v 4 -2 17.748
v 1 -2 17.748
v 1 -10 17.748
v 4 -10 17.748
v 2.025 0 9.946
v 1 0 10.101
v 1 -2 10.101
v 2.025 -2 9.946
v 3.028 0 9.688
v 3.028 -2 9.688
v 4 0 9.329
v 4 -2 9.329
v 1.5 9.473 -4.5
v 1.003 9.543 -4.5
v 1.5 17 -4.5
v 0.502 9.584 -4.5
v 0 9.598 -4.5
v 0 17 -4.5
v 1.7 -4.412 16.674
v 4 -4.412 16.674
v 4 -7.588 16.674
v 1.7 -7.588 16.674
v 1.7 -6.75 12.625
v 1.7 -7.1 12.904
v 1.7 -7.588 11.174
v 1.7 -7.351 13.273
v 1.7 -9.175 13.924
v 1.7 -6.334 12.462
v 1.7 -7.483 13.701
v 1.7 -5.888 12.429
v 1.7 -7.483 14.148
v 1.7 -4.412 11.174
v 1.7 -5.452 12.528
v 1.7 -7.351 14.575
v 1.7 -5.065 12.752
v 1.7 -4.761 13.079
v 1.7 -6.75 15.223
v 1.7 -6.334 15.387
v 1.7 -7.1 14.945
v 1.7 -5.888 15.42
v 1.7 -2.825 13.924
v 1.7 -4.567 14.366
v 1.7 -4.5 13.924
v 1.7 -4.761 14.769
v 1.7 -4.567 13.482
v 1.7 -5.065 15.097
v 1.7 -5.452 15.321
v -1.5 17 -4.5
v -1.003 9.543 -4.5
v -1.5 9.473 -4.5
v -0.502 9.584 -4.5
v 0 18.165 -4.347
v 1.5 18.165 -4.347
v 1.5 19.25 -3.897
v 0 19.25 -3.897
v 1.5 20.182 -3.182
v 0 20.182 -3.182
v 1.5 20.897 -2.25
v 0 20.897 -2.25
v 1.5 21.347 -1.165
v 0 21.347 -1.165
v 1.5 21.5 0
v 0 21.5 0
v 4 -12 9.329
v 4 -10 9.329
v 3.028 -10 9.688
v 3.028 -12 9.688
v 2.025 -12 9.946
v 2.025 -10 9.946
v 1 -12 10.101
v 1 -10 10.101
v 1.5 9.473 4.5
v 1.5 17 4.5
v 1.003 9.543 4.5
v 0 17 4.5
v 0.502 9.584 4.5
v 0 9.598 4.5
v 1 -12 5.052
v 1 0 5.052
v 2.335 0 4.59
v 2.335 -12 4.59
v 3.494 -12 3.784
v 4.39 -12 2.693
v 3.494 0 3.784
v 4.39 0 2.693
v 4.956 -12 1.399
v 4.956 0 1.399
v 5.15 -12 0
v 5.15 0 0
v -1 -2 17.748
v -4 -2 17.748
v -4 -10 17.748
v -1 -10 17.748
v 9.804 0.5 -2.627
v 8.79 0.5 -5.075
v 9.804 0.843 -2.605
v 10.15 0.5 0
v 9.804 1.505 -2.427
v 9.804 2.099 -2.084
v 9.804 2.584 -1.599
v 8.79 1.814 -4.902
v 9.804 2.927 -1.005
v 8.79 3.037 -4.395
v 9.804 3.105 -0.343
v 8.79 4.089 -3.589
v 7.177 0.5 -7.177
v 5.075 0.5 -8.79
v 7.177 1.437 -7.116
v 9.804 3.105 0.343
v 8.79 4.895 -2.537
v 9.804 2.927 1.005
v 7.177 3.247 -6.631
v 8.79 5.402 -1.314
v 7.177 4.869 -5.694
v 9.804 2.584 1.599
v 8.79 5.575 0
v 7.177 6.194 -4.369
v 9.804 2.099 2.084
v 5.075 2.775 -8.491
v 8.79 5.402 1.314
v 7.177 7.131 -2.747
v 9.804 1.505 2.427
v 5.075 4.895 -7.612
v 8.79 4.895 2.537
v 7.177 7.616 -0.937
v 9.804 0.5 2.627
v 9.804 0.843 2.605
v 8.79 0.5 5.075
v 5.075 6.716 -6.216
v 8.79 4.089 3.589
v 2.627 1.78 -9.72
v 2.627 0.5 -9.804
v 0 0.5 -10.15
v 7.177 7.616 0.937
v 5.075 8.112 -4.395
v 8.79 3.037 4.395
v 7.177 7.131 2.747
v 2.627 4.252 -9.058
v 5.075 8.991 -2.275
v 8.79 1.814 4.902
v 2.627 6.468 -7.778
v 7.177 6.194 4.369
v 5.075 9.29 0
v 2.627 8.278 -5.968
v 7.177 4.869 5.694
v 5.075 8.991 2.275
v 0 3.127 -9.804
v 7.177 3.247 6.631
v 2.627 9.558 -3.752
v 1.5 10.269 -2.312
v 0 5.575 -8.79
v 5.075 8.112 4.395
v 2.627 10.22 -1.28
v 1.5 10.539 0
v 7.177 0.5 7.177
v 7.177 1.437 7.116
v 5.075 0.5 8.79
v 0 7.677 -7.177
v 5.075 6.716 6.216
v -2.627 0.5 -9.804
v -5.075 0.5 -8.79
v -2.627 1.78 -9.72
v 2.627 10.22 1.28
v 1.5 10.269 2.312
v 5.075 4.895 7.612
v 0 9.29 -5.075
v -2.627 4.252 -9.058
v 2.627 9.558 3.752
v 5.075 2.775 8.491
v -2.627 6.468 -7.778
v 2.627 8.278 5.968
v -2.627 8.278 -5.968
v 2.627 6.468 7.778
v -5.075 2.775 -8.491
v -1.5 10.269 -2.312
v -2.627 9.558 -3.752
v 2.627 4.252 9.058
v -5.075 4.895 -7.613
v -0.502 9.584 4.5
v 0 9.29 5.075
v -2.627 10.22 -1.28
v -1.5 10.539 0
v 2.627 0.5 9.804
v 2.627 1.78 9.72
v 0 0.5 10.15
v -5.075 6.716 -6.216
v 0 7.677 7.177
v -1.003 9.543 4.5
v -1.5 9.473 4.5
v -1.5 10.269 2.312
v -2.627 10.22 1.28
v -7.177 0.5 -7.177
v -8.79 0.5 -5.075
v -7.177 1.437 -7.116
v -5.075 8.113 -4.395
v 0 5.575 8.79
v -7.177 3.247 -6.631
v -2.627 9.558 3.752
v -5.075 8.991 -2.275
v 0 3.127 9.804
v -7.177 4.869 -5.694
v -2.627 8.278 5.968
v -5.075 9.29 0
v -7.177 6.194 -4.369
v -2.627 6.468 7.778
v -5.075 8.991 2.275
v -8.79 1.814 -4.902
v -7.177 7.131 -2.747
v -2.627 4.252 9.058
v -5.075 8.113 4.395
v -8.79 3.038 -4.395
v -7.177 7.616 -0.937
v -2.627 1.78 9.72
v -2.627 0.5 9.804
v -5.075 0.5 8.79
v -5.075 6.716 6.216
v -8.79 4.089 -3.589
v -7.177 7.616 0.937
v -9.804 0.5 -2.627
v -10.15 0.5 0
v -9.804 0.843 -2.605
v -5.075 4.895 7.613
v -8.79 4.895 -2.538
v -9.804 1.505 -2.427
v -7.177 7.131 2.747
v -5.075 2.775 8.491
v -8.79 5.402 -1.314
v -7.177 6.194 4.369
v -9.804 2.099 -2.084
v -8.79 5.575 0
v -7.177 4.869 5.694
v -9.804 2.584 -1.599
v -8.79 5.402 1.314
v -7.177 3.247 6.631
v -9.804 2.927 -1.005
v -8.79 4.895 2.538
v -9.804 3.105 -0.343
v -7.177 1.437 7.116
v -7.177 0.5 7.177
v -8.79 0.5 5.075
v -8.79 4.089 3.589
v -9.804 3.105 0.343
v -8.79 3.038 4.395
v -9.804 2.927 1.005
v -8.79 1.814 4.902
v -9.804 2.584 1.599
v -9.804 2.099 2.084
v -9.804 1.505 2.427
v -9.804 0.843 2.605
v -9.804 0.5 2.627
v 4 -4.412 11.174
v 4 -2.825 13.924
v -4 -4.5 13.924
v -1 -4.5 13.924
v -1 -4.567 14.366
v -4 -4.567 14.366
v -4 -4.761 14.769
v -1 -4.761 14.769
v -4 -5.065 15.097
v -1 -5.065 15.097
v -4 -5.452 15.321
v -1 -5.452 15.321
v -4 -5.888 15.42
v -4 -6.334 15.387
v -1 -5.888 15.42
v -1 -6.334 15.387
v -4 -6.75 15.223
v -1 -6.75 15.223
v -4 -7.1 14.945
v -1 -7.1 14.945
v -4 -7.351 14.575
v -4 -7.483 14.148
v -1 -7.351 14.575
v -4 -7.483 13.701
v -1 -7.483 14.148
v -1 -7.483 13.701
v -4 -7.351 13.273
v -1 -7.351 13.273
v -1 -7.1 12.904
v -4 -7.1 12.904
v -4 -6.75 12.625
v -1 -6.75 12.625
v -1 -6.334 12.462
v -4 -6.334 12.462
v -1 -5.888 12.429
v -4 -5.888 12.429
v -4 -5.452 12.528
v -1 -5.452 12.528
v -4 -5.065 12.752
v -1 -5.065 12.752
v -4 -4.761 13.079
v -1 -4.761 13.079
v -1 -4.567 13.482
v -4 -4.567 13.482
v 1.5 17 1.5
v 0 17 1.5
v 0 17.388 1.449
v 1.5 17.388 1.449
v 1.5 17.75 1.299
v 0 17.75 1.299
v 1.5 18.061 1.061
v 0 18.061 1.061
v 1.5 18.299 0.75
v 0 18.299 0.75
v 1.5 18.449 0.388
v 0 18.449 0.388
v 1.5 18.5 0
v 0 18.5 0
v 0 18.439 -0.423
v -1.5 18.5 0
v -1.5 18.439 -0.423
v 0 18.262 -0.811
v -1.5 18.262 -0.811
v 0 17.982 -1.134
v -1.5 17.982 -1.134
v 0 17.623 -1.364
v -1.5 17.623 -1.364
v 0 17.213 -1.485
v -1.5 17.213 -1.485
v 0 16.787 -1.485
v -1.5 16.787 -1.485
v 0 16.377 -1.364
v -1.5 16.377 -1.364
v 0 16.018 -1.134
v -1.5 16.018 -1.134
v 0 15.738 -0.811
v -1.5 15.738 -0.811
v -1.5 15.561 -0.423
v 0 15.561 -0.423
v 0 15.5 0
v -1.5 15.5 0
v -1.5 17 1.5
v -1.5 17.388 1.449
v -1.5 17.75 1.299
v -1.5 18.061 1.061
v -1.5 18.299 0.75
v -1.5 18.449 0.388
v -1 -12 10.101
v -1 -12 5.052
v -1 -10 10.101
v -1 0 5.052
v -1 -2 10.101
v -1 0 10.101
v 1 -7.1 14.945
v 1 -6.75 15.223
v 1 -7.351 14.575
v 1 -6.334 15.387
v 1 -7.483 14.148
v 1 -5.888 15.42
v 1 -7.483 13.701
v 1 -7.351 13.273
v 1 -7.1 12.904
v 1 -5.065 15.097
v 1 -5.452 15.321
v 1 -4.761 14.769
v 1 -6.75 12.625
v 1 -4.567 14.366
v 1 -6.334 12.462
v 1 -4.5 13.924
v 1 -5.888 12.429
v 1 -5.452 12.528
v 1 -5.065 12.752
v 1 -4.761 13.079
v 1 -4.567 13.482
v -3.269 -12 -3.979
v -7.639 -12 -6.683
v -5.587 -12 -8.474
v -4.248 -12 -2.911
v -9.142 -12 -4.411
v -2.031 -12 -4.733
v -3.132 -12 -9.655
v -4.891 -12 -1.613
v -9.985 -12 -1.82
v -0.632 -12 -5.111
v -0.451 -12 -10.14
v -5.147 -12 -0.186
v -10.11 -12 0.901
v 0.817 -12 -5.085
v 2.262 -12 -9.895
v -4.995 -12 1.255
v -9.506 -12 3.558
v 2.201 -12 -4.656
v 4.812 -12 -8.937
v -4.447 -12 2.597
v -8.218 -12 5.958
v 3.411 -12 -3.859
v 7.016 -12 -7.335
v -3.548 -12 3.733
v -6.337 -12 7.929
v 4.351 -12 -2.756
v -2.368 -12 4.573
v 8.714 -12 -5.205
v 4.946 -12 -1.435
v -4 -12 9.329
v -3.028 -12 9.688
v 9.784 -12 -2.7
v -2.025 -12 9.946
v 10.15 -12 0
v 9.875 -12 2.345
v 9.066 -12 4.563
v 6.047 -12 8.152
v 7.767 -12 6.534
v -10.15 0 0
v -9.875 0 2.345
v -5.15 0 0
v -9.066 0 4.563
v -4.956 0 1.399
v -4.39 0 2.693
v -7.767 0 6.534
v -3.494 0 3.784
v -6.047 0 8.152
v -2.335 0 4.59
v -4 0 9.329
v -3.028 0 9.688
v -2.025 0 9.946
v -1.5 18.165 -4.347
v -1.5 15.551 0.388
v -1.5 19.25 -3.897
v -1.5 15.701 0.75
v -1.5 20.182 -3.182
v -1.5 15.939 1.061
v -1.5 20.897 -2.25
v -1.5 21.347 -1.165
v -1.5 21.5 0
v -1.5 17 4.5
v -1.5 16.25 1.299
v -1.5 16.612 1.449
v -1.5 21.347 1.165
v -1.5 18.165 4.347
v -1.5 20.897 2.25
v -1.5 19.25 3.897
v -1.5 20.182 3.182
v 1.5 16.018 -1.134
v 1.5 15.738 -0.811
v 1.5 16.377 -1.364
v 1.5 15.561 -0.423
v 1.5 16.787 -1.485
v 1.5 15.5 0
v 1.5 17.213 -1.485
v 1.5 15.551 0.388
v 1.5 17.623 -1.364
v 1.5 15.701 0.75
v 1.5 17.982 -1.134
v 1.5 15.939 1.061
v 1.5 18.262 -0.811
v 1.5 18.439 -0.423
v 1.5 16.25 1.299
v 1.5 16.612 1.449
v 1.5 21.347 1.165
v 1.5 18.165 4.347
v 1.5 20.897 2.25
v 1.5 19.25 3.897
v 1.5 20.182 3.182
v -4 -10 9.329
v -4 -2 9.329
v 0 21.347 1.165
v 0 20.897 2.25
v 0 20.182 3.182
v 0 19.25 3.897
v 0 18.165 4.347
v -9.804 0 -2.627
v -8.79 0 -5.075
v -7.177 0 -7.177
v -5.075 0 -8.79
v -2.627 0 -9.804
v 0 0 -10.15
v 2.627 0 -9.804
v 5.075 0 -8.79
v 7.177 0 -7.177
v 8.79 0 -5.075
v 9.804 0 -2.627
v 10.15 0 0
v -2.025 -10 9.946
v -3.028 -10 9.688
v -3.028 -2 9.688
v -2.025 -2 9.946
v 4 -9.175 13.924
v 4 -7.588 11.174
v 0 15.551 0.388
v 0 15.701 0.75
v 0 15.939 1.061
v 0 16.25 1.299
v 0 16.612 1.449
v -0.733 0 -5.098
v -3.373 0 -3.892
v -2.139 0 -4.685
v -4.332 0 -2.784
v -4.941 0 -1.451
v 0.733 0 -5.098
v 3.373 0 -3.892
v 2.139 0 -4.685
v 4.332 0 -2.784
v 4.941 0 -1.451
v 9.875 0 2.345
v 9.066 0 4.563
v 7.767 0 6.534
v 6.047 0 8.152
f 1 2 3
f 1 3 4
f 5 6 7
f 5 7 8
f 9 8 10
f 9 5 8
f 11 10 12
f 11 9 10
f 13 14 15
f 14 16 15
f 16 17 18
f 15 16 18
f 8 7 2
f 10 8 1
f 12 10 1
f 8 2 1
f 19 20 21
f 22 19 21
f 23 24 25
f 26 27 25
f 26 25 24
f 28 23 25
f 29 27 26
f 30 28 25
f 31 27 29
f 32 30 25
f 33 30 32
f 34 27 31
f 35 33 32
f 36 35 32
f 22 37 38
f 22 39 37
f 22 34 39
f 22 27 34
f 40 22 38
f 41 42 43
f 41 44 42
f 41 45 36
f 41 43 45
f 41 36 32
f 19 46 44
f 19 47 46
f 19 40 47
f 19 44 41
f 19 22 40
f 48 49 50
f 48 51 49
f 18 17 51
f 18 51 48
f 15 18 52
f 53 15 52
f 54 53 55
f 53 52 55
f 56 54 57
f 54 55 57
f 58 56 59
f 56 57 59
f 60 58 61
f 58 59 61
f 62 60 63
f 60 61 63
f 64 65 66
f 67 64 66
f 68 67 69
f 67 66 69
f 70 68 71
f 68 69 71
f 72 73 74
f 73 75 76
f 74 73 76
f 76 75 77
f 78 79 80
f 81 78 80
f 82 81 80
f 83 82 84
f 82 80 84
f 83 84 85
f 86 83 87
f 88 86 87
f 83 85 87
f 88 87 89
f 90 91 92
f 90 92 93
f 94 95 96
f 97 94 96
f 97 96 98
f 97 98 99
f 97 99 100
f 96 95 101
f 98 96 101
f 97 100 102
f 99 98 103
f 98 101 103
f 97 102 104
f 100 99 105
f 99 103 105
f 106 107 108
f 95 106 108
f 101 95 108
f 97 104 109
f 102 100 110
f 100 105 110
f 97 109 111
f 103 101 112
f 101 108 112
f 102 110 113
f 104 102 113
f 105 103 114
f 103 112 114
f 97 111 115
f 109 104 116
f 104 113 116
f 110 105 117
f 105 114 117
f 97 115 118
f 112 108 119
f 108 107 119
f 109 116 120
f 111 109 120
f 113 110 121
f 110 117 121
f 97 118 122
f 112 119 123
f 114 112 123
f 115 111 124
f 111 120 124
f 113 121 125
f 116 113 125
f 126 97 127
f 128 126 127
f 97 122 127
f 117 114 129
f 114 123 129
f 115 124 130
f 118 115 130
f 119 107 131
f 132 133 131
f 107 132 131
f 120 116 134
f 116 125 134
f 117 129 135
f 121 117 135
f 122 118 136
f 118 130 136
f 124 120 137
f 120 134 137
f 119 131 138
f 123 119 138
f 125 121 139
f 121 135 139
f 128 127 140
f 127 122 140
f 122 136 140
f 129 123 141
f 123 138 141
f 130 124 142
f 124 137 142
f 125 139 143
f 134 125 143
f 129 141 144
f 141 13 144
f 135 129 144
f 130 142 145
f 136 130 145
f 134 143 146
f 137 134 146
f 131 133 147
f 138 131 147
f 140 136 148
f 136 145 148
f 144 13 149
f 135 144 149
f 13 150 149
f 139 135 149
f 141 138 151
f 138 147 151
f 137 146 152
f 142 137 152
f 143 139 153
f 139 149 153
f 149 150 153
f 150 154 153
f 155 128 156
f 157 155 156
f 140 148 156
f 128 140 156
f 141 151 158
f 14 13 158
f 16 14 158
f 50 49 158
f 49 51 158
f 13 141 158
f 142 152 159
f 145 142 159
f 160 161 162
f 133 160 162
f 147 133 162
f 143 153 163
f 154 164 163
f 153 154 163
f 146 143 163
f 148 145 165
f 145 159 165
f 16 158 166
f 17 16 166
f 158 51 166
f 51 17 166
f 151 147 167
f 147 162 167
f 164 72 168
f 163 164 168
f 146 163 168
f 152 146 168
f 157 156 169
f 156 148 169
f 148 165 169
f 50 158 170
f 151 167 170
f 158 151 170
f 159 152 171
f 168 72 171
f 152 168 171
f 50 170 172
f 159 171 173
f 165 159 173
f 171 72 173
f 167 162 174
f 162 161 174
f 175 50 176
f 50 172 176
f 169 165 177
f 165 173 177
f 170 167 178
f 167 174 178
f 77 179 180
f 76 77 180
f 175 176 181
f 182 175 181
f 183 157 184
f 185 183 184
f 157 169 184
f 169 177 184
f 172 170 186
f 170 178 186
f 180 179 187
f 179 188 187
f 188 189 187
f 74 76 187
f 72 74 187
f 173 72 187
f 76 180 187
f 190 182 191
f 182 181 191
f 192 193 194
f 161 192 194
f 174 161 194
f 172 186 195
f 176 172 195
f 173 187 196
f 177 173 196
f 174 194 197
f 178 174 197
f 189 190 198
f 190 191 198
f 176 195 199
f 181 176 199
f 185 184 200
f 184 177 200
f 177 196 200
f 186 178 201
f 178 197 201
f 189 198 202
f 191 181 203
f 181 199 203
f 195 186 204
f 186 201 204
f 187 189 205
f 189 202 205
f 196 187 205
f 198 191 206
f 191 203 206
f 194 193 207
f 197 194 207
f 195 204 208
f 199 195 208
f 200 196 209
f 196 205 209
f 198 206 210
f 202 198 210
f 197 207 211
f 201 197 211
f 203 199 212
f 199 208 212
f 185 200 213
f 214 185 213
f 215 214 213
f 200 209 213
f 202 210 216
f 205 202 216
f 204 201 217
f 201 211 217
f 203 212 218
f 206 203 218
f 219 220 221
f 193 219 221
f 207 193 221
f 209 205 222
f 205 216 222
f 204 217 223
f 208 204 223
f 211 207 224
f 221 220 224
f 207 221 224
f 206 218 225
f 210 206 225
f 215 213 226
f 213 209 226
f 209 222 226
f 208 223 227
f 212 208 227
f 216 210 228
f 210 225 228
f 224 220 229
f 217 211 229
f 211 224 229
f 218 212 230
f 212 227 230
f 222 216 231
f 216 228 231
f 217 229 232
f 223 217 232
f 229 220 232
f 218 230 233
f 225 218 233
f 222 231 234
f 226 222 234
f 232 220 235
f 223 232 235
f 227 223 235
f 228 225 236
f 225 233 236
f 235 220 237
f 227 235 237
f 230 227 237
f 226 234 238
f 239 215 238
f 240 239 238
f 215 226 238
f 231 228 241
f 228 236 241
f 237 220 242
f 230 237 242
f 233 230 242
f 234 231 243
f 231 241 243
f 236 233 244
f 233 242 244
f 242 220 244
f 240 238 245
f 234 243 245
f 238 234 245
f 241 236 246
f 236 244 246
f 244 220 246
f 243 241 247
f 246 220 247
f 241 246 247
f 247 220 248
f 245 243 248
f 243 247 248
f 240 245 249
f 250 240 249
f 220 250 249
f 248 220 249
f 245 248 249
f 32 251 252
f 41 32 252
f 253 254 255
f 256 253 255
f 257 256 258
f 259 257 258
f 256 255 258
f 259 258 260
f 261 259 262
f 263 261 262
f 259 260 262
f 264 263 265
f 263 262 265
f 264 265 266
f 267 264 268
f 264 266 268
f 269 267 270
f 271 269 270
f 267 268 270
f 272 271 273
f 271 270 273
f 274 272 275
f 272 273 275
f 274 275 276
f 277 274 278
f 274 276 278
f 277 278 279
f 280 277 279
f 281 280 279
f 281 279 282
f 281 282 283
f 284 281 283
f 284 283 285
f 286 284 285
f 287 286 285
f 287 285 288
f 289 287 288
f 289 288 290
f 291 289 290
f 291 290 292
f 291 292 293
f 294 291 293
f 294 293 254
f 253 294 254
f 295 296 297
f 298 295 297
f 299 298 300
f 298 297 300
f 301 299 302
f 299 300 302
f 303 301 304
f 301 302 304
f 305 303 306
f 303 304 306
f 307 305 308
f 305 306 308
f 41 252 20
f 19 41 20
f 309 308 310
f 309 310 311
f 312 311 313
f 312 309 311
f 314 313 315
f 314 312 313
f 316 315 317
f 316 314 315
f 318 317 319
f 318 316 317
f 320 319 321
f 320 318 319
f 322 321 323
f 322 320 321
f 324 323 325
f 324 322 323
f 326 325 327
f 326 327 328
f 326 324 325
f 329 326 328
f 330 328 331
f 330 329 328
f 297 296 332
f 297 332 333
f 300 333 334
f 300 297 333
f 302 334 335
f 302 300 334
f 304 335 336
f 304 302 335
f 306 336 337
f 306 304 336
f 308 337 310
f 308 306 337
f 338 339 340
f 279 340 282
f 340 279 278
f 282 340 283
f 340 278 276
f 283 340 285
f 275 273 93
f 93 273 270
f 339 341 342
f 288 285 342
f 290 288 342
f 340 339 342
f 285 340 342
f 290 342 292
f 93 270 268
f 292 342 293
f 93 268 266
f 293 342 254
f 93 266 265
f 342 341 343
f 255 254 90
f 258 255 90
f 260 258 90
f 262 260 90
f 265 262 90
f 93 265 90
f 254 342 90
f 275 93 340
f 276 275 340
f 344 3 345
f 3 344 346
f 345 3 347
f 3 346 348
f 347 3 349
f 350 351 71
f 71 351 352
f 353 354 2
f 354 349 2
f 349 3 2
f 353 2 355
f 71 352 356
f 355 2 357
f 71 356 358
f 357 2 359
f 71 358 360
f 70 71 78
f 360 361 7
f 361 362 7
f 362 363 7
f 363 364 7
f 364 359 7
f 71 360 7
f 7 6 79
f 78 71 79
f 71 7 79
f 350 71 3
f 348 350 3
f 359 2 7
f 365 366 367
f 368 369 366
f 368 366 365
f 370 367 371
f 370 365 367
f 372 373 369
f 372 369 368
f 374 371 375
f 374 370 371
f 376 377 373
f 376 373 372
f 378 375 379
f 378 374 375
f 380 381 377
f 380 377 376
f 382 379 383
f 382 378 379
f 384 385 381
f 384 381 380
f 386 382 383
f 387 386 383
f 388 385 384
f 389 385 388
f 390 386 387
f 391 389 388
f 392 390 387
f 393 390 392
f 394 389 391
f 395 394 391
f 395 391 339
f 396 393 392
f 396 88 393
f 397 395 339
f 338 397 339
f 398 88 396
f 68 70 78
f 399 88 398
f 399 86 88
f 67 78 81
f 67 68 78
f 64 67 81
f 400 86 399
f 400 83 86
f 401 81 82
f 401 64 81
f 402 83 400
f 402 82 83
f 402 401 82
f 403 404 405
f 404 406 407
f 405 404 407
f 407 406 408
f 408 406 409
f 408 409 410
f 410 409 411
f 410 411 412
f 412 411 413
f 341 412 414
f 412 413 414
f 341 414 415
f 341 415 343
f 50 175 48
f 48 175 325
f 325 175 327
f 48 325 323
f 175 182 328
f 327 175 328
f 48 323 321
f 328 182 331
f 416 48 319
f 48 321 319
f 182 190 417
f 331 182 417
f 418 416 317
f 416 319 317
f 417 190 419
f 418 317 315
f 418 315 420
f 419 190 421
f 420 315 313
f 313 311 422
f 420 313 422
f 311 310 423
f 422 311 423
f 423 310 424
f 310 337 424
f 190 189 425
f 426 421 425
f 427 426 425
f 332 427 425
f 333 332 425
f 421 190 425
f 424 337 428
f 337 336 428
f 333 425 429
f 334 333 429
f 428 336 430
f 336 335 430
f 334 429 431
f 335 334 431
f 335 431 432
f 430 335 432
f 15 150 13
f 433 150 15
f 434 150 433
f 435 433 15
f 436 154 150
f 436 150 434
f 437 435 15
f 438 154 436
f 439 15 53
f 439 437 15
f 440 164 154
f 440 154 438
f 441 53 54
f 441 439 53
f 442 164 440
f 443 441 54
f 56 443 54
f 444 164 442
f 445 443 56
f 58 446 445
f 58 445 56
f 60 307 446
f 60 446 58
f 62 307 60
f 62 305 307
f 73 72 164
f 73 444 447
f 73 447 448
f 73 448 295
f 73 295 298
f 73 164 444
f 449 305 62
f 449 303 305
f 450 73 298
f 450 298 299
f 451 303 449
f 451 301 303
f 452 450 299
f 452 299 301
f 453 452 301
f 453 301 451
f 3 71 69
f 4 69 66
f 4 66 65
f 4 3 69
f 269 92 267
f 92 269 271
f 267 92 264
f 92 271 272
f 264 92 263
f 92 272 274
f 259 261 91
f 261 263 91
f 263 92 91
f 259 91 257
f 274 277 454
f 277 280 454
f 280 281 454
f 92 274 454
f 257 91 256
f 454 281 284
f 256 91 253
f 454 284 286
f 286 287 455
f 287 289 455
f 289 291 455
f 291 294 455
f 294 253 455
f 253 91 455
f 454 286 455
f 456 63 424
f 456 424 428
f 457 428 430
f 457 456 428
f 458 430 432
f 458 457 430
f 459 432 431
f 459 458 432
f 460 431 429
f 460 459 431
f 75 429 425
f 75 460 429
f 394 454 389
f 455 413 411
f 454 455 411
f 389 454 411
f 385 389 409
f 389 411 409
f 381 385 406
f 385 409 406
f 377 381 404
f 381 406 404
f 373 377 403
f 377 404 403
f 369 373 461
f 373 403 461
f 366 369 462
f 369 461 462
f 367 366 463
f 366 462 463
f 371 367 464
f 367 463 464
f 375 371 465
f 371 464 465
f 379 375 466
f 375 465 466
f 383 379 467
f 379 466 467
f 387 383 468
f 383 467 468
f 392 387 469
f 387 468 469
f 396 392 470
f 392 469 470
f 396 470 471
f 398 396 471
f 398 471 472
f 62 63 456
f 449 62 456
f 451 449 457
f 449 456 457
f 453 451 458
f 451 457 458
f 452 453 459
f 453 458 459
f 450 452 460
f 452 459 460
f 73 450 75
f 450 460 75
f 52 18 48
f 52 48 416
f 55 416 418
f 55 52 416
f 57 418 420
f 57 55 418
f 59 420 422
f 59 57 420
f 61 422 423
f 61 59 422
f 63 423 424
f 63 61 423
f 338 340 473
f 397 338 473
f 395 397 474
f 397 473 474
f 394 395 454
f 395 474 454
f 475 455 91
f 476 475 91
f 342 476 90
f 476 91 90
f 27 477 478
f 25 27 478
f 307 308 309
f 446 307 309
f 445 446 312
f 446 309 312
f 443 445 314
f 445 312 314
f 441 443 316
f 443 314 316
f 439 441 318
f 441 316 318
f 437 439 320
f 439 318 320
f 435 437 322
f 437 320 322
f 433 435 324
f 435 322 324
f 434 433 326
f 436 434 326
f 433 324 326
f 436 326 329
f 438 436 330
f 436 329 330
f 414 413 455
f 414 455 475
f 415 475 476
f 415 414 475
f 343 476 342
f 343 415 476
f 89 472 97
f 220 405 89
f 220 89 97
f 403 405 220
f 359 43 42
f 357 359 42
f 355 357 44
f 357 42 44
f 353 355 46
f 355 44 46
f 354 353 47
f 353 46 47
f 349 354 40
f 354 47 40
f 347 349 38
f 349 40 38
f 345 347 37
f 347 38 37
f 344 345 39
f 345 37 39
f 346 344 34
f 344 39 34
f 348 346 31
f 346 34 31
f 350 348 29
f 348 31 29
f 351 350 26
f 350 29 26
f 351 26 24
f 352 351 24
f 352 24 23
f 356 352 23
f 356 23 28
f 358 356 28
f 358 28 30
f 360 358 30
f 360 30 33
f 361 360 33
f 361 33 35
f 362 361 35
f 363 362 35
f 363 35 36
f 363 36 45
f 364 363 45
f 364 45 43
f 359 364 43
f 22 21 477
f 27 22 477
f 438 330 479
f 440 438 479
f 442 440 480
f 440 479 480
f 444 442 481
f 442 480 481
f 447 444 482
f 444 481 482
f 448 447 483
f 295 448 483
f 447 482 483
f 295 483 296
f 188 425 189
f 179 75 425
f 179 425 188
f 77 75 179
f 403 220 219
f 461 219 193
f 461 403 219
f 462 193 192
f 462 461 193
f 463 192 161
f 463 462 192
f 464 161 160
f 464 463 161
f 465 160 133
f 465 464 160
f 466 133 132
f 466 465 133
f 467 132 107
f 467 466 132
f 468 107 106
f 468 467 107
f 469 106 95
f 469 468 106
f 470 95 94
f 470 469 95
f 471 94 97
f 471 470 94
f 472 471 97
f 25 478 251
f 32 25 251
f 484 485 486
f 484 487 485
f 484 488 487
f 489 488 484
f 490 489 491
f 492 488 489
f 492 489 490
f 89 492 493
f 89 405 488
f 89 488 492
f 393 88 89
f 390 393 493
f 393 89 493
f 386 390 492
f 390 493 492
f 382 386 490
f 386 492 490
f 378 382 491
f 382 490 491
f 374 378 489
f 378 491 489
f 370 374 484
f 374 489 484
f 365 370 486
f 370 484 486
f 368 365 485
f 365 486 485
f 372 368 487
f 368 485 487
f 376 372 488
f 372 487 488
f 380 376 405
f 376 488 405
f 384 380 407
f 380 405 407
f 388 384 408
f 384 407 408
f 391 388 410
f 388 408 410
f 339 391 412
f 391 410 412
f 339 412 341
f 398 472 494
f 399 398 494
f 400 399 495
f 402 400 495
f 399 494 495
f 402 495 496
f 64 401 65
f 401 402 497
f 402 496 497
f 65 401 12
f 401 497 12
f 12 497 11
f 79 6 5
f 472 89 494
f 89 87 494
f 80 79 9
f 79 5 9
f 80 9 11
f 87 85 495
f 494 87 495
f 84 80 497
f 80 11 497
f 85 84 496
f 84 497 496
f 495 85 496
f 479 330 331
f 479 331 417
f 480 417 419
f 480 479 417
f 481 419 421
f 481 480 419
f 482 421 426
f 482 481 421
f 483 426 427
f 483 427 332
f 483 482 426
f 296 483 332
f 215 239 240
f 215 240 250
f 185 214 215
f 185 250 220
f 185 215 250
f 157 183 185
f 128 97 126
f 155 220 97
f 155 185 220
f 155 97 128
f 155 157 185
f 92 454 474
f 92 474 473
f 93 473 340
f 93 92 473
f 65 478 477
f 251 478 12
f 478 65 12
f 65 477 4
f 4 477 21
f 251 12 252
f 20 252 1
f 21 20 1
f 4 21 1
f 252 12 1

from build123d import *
from build123d import SkipClean  # not in build123d's __all__

# Parameters (mm, degrees)
F1_DEPTH  = 12
F0_W      = 3
F0_H      = 2.5
F2_DEPTH  = 10
F3_DEPTH  = 2
F5_R      = 1.5
F6_DEPTH  = 25
F7_DEPTH  = 2.3
F9_DEPTH  = 0.5
F11_ANGLE = 180
F12_DEPTH = 1.5


with BuildPart() as f1:
    # F0 (on Front) → F1 (new body)
    with BuildSketch(Plane.XZ):
        with BuildLine():
            Line((-4, 9.3285851017), (-1, 9.3285851017))
            Line((-1, 9.3285851017), (-1, 10.1006187929))
            ThreePointArc((-1, 10.1006187929), (-2.529626258, 9.8297248687), (-4, 9.3285851017))
        make_face()
        with BuildLine():
            Line((1, 10.1006187929), (1, 9.3285851017))
            Line((1, 9.3285851017), (4, 9.3285851017))
            ThreePointArc((4, 9.3285851017), (2.529626258, 9.8297248687), (1, 10.1006187929))
        make_face()
        with BuildLine():
            ThreePointArc((1, 5.0519798099), (3.9794786091, 3.2689830223), (5.15, 0))
            ThreePointArc((5.15, 0), (-3.2689830223, -3.9794786091), (-1, 5.0519798099))
            Line((-1, 5.0519798099), (-1, 9.3285851017))
            Line((-1, 9.3285851017), (-4, 9.3285851017))
            ThreePointArc((-4, 9.3285851017), (-5.5867029633, -8.474151875), (10.15, 0))
            ThreePointArc((10.15, 0), (8.474151875, 5.5867029633), (4, 9.3285851017))
            Line((4, 9.3285851017), (1, 9.3285851017))
            Line((1, 9.3285851017), (1, 5.0519798099))
        make_face()
    extrude(amount=F1_DEPTH)

    # F0 (on Front) → F2 (join)
    with BuildSketch(Plane.XZ):
        with BuildLine():
            ThreePointArc((-4, 9.3285851017), (-2.529626258, 9.8297248687), (-1, 10.1006187929))
            Line((-1, 10.1006187929), (-1, 15.2480201901))
            Line((-1, 15.2480201901), (-4, 15.2480201901))
            Line((-4, 15.2480201901), (-4, 9.3285851017))
        make_face()
        with BuildLine():
            Line((1, 15.2480201901), (1, 10.1006187929))
            ThreePointArc((1, 10.1006187929), (2.529626258, 9.8297248687), (4, 9.3285851017))
            Line((4, 9.3285851017), (4, 15.2480201901))
            Line((4, 15.2480201901), (1, 15.2480201901))
        make_face()
        with Locations((-2.5, 16.4980201901)):
            Rectangle(F0_W, F0_H)
        with Locations((2.5, 16.4980201901)):
            Rectangle(F0_W, F0_H)
    extrude(amount=F2_DEPTH)

    # F0 (on Front) → F3 (cut)
    with BuildSketch(Plane.XZ):
        with BuildLine():
            ThreePointArc((-4, 9.3285851017), (-2.529626258, 9.8297248687), (-1, 10.1006187929))
            Line((-1, 10.1006187929), (-1, 15.2480201901))
            Line((-1, 15.2480201901), (-4, 15.2480201901))
            Line((-4, 15.2480201901), (-4, 9.3285851017))
        make_face()
        with BuildLine():
            Line((1, 15.2480201901), (1, 10.1006187929))
            ThreePointArc((1, 10.1006187929), (2.529626258, 9.8297248687), (4, 9.3285851017))
            Line((4, 9.3285851017), (4, 15.2480201901))
            Line((4, 15.2480201901), (1, 15.2480201901))
        make_face()
        with Locations((-2.5, 16.4980201901)):
            Rectangle(F0_W, F0_H)
        with Locations((2.5, 16.4980201901)):
            Rectangle(F0_W, F0_H)
    with SkipClean():  # cleaning this boolean's faces spoils the solid; the shape is the same uncleaned
        extrude(amount=F3_DEPTH, mode=Mode.SUBTRACT)

    # F5 (on face) → F6 (cut)
    with BuildSketch(Plane.YZ.offset(4)):
        with Locations((-6, 13.9243194915)):
            Circle(F5_R)
    extrude(amount=-F6_DEPTH, mode=Mode.SUBTRACT)

    # F5 (on face) → F7 (cut)
    with BuildSketch(Plane.YZ.offset(4)):
        Polygon((-4.4122867597, 16.6743194915), (-7.5877132403, 16.6743194915), (-9.1754264805, 13.9243194915), (-7.5877132403, 11.1743194915), (-4.4122867597, 11.1743194915), (-2.8245735195, 13.9243194915), align=None)
        with Locations((-6, 13.9243194915)):
            Circle(F5_R, mode=Mode.SUBTRACT)
    extrude(amount=-F7_DEPTH, mode=Mode.SUBTRACT)

    # F8 (on face) → F9 (join)
    with BuildSketch(Plane.XZ):
        with BuildLine():
            Line((10.15, 0), (5.15, 0))
            ThreePointArc((5.15, 0), (0, -5.15), (-5.15, 0))
            Line((-5.15, 0), (-10.15, 0))
            ThreePointArc((-10.15, 0), (0, -10.15), (10.15, 0))
        make_face()
        with BuildLine():
            ThreePointArc((-5.15, 0), (0, -5.15), (5.15, 0))
            Line((5.15, 0), (-5.15, 0))
        make_face()
    extrude(amount=-F9_DEPTH)

    # F9_face (on face) → F11 (revolve)
    with BuildSketch(Plane(origin=(0, 0.5, -4.307793793), x_dir=(1, 0, 0), z_dir=(0, 1, 0))):
        with BuildLine():
            Line((-10.15, -4.307793793), (10.15, -4.307793793))
            ThreePointArc((10.15, -4.307793793), (0, 5.842206207), (-10.15, -4.307793793))
        make_face()
    revolve(axis=Axis((0, 0.5, 0), (1, 0, 0)), revolution_arc=F11_ANGLE)

    # F10 (on Right) → F12 (join, symmetric)
    with BuildSketch(Plane.YZ):
        with BuildLine():
            ThreePointArc((17, 4.5), (13.8180194847, 3.1819805153), (12.5, 0))
            Line((12.5, 0), (15.5, 0))
            ThreePointArc((15.5, 0), (15.9393398282, 1.0606601718), (17, 1.5))
            Line((17, 1.5), (17, 4.5))
        make_face()
        with BuildLine():
            ThreePointArc((9.0979393271, 4.5), (9.8834858266, 2.3106726109), (10.15, 0))
            Line((10.15, 0), (12.5, 0))
            ThreePointArc((12.5, 0), (13.8180194847, 3.1819805153), (17, 4.5))
            Line((17, 4.5), (9.0979393271, 4.5))
        make_face()
        with BuildLine():
            Line((12.5, 0), (10.15, 0))
            ThreePointArc((10.15, 0), (9.8834858266, -2.3106726109), (9.0979393271, -4.5))
            Line((9.0979393271, -4.5), (17, -4.5))
            ThreePointArc((17, -4.5), (13.8180194847, -3.1819805153), (12.5, 0))
        make_face()
        with BuildLine():
            Line((15.5, 0), (12.5, 0))
            ThreePointArc((12.5, 0), (13.8180194847, -3.1819805153), (17, -4.5))
            ThreePointArc((17, -4.5), (20.1819805153, -3.1819805153), (21.5, 0))
            ThreePointArc((21.5, 0), (20.1819805153, 3.1819805153), (17, 4.5))
            Line((17, 4.5), (17, 1.5))
            ThreePointArc((17, 1.5), (18.0606601718, 1.0606601718), (18.5, 0))
            ThreePointArc((18.5, 0), (17, -1.5), (15.5, 0))
        make_face()
    extrude(amount=F12_DEPTH, both=True)


solid = f1.part
